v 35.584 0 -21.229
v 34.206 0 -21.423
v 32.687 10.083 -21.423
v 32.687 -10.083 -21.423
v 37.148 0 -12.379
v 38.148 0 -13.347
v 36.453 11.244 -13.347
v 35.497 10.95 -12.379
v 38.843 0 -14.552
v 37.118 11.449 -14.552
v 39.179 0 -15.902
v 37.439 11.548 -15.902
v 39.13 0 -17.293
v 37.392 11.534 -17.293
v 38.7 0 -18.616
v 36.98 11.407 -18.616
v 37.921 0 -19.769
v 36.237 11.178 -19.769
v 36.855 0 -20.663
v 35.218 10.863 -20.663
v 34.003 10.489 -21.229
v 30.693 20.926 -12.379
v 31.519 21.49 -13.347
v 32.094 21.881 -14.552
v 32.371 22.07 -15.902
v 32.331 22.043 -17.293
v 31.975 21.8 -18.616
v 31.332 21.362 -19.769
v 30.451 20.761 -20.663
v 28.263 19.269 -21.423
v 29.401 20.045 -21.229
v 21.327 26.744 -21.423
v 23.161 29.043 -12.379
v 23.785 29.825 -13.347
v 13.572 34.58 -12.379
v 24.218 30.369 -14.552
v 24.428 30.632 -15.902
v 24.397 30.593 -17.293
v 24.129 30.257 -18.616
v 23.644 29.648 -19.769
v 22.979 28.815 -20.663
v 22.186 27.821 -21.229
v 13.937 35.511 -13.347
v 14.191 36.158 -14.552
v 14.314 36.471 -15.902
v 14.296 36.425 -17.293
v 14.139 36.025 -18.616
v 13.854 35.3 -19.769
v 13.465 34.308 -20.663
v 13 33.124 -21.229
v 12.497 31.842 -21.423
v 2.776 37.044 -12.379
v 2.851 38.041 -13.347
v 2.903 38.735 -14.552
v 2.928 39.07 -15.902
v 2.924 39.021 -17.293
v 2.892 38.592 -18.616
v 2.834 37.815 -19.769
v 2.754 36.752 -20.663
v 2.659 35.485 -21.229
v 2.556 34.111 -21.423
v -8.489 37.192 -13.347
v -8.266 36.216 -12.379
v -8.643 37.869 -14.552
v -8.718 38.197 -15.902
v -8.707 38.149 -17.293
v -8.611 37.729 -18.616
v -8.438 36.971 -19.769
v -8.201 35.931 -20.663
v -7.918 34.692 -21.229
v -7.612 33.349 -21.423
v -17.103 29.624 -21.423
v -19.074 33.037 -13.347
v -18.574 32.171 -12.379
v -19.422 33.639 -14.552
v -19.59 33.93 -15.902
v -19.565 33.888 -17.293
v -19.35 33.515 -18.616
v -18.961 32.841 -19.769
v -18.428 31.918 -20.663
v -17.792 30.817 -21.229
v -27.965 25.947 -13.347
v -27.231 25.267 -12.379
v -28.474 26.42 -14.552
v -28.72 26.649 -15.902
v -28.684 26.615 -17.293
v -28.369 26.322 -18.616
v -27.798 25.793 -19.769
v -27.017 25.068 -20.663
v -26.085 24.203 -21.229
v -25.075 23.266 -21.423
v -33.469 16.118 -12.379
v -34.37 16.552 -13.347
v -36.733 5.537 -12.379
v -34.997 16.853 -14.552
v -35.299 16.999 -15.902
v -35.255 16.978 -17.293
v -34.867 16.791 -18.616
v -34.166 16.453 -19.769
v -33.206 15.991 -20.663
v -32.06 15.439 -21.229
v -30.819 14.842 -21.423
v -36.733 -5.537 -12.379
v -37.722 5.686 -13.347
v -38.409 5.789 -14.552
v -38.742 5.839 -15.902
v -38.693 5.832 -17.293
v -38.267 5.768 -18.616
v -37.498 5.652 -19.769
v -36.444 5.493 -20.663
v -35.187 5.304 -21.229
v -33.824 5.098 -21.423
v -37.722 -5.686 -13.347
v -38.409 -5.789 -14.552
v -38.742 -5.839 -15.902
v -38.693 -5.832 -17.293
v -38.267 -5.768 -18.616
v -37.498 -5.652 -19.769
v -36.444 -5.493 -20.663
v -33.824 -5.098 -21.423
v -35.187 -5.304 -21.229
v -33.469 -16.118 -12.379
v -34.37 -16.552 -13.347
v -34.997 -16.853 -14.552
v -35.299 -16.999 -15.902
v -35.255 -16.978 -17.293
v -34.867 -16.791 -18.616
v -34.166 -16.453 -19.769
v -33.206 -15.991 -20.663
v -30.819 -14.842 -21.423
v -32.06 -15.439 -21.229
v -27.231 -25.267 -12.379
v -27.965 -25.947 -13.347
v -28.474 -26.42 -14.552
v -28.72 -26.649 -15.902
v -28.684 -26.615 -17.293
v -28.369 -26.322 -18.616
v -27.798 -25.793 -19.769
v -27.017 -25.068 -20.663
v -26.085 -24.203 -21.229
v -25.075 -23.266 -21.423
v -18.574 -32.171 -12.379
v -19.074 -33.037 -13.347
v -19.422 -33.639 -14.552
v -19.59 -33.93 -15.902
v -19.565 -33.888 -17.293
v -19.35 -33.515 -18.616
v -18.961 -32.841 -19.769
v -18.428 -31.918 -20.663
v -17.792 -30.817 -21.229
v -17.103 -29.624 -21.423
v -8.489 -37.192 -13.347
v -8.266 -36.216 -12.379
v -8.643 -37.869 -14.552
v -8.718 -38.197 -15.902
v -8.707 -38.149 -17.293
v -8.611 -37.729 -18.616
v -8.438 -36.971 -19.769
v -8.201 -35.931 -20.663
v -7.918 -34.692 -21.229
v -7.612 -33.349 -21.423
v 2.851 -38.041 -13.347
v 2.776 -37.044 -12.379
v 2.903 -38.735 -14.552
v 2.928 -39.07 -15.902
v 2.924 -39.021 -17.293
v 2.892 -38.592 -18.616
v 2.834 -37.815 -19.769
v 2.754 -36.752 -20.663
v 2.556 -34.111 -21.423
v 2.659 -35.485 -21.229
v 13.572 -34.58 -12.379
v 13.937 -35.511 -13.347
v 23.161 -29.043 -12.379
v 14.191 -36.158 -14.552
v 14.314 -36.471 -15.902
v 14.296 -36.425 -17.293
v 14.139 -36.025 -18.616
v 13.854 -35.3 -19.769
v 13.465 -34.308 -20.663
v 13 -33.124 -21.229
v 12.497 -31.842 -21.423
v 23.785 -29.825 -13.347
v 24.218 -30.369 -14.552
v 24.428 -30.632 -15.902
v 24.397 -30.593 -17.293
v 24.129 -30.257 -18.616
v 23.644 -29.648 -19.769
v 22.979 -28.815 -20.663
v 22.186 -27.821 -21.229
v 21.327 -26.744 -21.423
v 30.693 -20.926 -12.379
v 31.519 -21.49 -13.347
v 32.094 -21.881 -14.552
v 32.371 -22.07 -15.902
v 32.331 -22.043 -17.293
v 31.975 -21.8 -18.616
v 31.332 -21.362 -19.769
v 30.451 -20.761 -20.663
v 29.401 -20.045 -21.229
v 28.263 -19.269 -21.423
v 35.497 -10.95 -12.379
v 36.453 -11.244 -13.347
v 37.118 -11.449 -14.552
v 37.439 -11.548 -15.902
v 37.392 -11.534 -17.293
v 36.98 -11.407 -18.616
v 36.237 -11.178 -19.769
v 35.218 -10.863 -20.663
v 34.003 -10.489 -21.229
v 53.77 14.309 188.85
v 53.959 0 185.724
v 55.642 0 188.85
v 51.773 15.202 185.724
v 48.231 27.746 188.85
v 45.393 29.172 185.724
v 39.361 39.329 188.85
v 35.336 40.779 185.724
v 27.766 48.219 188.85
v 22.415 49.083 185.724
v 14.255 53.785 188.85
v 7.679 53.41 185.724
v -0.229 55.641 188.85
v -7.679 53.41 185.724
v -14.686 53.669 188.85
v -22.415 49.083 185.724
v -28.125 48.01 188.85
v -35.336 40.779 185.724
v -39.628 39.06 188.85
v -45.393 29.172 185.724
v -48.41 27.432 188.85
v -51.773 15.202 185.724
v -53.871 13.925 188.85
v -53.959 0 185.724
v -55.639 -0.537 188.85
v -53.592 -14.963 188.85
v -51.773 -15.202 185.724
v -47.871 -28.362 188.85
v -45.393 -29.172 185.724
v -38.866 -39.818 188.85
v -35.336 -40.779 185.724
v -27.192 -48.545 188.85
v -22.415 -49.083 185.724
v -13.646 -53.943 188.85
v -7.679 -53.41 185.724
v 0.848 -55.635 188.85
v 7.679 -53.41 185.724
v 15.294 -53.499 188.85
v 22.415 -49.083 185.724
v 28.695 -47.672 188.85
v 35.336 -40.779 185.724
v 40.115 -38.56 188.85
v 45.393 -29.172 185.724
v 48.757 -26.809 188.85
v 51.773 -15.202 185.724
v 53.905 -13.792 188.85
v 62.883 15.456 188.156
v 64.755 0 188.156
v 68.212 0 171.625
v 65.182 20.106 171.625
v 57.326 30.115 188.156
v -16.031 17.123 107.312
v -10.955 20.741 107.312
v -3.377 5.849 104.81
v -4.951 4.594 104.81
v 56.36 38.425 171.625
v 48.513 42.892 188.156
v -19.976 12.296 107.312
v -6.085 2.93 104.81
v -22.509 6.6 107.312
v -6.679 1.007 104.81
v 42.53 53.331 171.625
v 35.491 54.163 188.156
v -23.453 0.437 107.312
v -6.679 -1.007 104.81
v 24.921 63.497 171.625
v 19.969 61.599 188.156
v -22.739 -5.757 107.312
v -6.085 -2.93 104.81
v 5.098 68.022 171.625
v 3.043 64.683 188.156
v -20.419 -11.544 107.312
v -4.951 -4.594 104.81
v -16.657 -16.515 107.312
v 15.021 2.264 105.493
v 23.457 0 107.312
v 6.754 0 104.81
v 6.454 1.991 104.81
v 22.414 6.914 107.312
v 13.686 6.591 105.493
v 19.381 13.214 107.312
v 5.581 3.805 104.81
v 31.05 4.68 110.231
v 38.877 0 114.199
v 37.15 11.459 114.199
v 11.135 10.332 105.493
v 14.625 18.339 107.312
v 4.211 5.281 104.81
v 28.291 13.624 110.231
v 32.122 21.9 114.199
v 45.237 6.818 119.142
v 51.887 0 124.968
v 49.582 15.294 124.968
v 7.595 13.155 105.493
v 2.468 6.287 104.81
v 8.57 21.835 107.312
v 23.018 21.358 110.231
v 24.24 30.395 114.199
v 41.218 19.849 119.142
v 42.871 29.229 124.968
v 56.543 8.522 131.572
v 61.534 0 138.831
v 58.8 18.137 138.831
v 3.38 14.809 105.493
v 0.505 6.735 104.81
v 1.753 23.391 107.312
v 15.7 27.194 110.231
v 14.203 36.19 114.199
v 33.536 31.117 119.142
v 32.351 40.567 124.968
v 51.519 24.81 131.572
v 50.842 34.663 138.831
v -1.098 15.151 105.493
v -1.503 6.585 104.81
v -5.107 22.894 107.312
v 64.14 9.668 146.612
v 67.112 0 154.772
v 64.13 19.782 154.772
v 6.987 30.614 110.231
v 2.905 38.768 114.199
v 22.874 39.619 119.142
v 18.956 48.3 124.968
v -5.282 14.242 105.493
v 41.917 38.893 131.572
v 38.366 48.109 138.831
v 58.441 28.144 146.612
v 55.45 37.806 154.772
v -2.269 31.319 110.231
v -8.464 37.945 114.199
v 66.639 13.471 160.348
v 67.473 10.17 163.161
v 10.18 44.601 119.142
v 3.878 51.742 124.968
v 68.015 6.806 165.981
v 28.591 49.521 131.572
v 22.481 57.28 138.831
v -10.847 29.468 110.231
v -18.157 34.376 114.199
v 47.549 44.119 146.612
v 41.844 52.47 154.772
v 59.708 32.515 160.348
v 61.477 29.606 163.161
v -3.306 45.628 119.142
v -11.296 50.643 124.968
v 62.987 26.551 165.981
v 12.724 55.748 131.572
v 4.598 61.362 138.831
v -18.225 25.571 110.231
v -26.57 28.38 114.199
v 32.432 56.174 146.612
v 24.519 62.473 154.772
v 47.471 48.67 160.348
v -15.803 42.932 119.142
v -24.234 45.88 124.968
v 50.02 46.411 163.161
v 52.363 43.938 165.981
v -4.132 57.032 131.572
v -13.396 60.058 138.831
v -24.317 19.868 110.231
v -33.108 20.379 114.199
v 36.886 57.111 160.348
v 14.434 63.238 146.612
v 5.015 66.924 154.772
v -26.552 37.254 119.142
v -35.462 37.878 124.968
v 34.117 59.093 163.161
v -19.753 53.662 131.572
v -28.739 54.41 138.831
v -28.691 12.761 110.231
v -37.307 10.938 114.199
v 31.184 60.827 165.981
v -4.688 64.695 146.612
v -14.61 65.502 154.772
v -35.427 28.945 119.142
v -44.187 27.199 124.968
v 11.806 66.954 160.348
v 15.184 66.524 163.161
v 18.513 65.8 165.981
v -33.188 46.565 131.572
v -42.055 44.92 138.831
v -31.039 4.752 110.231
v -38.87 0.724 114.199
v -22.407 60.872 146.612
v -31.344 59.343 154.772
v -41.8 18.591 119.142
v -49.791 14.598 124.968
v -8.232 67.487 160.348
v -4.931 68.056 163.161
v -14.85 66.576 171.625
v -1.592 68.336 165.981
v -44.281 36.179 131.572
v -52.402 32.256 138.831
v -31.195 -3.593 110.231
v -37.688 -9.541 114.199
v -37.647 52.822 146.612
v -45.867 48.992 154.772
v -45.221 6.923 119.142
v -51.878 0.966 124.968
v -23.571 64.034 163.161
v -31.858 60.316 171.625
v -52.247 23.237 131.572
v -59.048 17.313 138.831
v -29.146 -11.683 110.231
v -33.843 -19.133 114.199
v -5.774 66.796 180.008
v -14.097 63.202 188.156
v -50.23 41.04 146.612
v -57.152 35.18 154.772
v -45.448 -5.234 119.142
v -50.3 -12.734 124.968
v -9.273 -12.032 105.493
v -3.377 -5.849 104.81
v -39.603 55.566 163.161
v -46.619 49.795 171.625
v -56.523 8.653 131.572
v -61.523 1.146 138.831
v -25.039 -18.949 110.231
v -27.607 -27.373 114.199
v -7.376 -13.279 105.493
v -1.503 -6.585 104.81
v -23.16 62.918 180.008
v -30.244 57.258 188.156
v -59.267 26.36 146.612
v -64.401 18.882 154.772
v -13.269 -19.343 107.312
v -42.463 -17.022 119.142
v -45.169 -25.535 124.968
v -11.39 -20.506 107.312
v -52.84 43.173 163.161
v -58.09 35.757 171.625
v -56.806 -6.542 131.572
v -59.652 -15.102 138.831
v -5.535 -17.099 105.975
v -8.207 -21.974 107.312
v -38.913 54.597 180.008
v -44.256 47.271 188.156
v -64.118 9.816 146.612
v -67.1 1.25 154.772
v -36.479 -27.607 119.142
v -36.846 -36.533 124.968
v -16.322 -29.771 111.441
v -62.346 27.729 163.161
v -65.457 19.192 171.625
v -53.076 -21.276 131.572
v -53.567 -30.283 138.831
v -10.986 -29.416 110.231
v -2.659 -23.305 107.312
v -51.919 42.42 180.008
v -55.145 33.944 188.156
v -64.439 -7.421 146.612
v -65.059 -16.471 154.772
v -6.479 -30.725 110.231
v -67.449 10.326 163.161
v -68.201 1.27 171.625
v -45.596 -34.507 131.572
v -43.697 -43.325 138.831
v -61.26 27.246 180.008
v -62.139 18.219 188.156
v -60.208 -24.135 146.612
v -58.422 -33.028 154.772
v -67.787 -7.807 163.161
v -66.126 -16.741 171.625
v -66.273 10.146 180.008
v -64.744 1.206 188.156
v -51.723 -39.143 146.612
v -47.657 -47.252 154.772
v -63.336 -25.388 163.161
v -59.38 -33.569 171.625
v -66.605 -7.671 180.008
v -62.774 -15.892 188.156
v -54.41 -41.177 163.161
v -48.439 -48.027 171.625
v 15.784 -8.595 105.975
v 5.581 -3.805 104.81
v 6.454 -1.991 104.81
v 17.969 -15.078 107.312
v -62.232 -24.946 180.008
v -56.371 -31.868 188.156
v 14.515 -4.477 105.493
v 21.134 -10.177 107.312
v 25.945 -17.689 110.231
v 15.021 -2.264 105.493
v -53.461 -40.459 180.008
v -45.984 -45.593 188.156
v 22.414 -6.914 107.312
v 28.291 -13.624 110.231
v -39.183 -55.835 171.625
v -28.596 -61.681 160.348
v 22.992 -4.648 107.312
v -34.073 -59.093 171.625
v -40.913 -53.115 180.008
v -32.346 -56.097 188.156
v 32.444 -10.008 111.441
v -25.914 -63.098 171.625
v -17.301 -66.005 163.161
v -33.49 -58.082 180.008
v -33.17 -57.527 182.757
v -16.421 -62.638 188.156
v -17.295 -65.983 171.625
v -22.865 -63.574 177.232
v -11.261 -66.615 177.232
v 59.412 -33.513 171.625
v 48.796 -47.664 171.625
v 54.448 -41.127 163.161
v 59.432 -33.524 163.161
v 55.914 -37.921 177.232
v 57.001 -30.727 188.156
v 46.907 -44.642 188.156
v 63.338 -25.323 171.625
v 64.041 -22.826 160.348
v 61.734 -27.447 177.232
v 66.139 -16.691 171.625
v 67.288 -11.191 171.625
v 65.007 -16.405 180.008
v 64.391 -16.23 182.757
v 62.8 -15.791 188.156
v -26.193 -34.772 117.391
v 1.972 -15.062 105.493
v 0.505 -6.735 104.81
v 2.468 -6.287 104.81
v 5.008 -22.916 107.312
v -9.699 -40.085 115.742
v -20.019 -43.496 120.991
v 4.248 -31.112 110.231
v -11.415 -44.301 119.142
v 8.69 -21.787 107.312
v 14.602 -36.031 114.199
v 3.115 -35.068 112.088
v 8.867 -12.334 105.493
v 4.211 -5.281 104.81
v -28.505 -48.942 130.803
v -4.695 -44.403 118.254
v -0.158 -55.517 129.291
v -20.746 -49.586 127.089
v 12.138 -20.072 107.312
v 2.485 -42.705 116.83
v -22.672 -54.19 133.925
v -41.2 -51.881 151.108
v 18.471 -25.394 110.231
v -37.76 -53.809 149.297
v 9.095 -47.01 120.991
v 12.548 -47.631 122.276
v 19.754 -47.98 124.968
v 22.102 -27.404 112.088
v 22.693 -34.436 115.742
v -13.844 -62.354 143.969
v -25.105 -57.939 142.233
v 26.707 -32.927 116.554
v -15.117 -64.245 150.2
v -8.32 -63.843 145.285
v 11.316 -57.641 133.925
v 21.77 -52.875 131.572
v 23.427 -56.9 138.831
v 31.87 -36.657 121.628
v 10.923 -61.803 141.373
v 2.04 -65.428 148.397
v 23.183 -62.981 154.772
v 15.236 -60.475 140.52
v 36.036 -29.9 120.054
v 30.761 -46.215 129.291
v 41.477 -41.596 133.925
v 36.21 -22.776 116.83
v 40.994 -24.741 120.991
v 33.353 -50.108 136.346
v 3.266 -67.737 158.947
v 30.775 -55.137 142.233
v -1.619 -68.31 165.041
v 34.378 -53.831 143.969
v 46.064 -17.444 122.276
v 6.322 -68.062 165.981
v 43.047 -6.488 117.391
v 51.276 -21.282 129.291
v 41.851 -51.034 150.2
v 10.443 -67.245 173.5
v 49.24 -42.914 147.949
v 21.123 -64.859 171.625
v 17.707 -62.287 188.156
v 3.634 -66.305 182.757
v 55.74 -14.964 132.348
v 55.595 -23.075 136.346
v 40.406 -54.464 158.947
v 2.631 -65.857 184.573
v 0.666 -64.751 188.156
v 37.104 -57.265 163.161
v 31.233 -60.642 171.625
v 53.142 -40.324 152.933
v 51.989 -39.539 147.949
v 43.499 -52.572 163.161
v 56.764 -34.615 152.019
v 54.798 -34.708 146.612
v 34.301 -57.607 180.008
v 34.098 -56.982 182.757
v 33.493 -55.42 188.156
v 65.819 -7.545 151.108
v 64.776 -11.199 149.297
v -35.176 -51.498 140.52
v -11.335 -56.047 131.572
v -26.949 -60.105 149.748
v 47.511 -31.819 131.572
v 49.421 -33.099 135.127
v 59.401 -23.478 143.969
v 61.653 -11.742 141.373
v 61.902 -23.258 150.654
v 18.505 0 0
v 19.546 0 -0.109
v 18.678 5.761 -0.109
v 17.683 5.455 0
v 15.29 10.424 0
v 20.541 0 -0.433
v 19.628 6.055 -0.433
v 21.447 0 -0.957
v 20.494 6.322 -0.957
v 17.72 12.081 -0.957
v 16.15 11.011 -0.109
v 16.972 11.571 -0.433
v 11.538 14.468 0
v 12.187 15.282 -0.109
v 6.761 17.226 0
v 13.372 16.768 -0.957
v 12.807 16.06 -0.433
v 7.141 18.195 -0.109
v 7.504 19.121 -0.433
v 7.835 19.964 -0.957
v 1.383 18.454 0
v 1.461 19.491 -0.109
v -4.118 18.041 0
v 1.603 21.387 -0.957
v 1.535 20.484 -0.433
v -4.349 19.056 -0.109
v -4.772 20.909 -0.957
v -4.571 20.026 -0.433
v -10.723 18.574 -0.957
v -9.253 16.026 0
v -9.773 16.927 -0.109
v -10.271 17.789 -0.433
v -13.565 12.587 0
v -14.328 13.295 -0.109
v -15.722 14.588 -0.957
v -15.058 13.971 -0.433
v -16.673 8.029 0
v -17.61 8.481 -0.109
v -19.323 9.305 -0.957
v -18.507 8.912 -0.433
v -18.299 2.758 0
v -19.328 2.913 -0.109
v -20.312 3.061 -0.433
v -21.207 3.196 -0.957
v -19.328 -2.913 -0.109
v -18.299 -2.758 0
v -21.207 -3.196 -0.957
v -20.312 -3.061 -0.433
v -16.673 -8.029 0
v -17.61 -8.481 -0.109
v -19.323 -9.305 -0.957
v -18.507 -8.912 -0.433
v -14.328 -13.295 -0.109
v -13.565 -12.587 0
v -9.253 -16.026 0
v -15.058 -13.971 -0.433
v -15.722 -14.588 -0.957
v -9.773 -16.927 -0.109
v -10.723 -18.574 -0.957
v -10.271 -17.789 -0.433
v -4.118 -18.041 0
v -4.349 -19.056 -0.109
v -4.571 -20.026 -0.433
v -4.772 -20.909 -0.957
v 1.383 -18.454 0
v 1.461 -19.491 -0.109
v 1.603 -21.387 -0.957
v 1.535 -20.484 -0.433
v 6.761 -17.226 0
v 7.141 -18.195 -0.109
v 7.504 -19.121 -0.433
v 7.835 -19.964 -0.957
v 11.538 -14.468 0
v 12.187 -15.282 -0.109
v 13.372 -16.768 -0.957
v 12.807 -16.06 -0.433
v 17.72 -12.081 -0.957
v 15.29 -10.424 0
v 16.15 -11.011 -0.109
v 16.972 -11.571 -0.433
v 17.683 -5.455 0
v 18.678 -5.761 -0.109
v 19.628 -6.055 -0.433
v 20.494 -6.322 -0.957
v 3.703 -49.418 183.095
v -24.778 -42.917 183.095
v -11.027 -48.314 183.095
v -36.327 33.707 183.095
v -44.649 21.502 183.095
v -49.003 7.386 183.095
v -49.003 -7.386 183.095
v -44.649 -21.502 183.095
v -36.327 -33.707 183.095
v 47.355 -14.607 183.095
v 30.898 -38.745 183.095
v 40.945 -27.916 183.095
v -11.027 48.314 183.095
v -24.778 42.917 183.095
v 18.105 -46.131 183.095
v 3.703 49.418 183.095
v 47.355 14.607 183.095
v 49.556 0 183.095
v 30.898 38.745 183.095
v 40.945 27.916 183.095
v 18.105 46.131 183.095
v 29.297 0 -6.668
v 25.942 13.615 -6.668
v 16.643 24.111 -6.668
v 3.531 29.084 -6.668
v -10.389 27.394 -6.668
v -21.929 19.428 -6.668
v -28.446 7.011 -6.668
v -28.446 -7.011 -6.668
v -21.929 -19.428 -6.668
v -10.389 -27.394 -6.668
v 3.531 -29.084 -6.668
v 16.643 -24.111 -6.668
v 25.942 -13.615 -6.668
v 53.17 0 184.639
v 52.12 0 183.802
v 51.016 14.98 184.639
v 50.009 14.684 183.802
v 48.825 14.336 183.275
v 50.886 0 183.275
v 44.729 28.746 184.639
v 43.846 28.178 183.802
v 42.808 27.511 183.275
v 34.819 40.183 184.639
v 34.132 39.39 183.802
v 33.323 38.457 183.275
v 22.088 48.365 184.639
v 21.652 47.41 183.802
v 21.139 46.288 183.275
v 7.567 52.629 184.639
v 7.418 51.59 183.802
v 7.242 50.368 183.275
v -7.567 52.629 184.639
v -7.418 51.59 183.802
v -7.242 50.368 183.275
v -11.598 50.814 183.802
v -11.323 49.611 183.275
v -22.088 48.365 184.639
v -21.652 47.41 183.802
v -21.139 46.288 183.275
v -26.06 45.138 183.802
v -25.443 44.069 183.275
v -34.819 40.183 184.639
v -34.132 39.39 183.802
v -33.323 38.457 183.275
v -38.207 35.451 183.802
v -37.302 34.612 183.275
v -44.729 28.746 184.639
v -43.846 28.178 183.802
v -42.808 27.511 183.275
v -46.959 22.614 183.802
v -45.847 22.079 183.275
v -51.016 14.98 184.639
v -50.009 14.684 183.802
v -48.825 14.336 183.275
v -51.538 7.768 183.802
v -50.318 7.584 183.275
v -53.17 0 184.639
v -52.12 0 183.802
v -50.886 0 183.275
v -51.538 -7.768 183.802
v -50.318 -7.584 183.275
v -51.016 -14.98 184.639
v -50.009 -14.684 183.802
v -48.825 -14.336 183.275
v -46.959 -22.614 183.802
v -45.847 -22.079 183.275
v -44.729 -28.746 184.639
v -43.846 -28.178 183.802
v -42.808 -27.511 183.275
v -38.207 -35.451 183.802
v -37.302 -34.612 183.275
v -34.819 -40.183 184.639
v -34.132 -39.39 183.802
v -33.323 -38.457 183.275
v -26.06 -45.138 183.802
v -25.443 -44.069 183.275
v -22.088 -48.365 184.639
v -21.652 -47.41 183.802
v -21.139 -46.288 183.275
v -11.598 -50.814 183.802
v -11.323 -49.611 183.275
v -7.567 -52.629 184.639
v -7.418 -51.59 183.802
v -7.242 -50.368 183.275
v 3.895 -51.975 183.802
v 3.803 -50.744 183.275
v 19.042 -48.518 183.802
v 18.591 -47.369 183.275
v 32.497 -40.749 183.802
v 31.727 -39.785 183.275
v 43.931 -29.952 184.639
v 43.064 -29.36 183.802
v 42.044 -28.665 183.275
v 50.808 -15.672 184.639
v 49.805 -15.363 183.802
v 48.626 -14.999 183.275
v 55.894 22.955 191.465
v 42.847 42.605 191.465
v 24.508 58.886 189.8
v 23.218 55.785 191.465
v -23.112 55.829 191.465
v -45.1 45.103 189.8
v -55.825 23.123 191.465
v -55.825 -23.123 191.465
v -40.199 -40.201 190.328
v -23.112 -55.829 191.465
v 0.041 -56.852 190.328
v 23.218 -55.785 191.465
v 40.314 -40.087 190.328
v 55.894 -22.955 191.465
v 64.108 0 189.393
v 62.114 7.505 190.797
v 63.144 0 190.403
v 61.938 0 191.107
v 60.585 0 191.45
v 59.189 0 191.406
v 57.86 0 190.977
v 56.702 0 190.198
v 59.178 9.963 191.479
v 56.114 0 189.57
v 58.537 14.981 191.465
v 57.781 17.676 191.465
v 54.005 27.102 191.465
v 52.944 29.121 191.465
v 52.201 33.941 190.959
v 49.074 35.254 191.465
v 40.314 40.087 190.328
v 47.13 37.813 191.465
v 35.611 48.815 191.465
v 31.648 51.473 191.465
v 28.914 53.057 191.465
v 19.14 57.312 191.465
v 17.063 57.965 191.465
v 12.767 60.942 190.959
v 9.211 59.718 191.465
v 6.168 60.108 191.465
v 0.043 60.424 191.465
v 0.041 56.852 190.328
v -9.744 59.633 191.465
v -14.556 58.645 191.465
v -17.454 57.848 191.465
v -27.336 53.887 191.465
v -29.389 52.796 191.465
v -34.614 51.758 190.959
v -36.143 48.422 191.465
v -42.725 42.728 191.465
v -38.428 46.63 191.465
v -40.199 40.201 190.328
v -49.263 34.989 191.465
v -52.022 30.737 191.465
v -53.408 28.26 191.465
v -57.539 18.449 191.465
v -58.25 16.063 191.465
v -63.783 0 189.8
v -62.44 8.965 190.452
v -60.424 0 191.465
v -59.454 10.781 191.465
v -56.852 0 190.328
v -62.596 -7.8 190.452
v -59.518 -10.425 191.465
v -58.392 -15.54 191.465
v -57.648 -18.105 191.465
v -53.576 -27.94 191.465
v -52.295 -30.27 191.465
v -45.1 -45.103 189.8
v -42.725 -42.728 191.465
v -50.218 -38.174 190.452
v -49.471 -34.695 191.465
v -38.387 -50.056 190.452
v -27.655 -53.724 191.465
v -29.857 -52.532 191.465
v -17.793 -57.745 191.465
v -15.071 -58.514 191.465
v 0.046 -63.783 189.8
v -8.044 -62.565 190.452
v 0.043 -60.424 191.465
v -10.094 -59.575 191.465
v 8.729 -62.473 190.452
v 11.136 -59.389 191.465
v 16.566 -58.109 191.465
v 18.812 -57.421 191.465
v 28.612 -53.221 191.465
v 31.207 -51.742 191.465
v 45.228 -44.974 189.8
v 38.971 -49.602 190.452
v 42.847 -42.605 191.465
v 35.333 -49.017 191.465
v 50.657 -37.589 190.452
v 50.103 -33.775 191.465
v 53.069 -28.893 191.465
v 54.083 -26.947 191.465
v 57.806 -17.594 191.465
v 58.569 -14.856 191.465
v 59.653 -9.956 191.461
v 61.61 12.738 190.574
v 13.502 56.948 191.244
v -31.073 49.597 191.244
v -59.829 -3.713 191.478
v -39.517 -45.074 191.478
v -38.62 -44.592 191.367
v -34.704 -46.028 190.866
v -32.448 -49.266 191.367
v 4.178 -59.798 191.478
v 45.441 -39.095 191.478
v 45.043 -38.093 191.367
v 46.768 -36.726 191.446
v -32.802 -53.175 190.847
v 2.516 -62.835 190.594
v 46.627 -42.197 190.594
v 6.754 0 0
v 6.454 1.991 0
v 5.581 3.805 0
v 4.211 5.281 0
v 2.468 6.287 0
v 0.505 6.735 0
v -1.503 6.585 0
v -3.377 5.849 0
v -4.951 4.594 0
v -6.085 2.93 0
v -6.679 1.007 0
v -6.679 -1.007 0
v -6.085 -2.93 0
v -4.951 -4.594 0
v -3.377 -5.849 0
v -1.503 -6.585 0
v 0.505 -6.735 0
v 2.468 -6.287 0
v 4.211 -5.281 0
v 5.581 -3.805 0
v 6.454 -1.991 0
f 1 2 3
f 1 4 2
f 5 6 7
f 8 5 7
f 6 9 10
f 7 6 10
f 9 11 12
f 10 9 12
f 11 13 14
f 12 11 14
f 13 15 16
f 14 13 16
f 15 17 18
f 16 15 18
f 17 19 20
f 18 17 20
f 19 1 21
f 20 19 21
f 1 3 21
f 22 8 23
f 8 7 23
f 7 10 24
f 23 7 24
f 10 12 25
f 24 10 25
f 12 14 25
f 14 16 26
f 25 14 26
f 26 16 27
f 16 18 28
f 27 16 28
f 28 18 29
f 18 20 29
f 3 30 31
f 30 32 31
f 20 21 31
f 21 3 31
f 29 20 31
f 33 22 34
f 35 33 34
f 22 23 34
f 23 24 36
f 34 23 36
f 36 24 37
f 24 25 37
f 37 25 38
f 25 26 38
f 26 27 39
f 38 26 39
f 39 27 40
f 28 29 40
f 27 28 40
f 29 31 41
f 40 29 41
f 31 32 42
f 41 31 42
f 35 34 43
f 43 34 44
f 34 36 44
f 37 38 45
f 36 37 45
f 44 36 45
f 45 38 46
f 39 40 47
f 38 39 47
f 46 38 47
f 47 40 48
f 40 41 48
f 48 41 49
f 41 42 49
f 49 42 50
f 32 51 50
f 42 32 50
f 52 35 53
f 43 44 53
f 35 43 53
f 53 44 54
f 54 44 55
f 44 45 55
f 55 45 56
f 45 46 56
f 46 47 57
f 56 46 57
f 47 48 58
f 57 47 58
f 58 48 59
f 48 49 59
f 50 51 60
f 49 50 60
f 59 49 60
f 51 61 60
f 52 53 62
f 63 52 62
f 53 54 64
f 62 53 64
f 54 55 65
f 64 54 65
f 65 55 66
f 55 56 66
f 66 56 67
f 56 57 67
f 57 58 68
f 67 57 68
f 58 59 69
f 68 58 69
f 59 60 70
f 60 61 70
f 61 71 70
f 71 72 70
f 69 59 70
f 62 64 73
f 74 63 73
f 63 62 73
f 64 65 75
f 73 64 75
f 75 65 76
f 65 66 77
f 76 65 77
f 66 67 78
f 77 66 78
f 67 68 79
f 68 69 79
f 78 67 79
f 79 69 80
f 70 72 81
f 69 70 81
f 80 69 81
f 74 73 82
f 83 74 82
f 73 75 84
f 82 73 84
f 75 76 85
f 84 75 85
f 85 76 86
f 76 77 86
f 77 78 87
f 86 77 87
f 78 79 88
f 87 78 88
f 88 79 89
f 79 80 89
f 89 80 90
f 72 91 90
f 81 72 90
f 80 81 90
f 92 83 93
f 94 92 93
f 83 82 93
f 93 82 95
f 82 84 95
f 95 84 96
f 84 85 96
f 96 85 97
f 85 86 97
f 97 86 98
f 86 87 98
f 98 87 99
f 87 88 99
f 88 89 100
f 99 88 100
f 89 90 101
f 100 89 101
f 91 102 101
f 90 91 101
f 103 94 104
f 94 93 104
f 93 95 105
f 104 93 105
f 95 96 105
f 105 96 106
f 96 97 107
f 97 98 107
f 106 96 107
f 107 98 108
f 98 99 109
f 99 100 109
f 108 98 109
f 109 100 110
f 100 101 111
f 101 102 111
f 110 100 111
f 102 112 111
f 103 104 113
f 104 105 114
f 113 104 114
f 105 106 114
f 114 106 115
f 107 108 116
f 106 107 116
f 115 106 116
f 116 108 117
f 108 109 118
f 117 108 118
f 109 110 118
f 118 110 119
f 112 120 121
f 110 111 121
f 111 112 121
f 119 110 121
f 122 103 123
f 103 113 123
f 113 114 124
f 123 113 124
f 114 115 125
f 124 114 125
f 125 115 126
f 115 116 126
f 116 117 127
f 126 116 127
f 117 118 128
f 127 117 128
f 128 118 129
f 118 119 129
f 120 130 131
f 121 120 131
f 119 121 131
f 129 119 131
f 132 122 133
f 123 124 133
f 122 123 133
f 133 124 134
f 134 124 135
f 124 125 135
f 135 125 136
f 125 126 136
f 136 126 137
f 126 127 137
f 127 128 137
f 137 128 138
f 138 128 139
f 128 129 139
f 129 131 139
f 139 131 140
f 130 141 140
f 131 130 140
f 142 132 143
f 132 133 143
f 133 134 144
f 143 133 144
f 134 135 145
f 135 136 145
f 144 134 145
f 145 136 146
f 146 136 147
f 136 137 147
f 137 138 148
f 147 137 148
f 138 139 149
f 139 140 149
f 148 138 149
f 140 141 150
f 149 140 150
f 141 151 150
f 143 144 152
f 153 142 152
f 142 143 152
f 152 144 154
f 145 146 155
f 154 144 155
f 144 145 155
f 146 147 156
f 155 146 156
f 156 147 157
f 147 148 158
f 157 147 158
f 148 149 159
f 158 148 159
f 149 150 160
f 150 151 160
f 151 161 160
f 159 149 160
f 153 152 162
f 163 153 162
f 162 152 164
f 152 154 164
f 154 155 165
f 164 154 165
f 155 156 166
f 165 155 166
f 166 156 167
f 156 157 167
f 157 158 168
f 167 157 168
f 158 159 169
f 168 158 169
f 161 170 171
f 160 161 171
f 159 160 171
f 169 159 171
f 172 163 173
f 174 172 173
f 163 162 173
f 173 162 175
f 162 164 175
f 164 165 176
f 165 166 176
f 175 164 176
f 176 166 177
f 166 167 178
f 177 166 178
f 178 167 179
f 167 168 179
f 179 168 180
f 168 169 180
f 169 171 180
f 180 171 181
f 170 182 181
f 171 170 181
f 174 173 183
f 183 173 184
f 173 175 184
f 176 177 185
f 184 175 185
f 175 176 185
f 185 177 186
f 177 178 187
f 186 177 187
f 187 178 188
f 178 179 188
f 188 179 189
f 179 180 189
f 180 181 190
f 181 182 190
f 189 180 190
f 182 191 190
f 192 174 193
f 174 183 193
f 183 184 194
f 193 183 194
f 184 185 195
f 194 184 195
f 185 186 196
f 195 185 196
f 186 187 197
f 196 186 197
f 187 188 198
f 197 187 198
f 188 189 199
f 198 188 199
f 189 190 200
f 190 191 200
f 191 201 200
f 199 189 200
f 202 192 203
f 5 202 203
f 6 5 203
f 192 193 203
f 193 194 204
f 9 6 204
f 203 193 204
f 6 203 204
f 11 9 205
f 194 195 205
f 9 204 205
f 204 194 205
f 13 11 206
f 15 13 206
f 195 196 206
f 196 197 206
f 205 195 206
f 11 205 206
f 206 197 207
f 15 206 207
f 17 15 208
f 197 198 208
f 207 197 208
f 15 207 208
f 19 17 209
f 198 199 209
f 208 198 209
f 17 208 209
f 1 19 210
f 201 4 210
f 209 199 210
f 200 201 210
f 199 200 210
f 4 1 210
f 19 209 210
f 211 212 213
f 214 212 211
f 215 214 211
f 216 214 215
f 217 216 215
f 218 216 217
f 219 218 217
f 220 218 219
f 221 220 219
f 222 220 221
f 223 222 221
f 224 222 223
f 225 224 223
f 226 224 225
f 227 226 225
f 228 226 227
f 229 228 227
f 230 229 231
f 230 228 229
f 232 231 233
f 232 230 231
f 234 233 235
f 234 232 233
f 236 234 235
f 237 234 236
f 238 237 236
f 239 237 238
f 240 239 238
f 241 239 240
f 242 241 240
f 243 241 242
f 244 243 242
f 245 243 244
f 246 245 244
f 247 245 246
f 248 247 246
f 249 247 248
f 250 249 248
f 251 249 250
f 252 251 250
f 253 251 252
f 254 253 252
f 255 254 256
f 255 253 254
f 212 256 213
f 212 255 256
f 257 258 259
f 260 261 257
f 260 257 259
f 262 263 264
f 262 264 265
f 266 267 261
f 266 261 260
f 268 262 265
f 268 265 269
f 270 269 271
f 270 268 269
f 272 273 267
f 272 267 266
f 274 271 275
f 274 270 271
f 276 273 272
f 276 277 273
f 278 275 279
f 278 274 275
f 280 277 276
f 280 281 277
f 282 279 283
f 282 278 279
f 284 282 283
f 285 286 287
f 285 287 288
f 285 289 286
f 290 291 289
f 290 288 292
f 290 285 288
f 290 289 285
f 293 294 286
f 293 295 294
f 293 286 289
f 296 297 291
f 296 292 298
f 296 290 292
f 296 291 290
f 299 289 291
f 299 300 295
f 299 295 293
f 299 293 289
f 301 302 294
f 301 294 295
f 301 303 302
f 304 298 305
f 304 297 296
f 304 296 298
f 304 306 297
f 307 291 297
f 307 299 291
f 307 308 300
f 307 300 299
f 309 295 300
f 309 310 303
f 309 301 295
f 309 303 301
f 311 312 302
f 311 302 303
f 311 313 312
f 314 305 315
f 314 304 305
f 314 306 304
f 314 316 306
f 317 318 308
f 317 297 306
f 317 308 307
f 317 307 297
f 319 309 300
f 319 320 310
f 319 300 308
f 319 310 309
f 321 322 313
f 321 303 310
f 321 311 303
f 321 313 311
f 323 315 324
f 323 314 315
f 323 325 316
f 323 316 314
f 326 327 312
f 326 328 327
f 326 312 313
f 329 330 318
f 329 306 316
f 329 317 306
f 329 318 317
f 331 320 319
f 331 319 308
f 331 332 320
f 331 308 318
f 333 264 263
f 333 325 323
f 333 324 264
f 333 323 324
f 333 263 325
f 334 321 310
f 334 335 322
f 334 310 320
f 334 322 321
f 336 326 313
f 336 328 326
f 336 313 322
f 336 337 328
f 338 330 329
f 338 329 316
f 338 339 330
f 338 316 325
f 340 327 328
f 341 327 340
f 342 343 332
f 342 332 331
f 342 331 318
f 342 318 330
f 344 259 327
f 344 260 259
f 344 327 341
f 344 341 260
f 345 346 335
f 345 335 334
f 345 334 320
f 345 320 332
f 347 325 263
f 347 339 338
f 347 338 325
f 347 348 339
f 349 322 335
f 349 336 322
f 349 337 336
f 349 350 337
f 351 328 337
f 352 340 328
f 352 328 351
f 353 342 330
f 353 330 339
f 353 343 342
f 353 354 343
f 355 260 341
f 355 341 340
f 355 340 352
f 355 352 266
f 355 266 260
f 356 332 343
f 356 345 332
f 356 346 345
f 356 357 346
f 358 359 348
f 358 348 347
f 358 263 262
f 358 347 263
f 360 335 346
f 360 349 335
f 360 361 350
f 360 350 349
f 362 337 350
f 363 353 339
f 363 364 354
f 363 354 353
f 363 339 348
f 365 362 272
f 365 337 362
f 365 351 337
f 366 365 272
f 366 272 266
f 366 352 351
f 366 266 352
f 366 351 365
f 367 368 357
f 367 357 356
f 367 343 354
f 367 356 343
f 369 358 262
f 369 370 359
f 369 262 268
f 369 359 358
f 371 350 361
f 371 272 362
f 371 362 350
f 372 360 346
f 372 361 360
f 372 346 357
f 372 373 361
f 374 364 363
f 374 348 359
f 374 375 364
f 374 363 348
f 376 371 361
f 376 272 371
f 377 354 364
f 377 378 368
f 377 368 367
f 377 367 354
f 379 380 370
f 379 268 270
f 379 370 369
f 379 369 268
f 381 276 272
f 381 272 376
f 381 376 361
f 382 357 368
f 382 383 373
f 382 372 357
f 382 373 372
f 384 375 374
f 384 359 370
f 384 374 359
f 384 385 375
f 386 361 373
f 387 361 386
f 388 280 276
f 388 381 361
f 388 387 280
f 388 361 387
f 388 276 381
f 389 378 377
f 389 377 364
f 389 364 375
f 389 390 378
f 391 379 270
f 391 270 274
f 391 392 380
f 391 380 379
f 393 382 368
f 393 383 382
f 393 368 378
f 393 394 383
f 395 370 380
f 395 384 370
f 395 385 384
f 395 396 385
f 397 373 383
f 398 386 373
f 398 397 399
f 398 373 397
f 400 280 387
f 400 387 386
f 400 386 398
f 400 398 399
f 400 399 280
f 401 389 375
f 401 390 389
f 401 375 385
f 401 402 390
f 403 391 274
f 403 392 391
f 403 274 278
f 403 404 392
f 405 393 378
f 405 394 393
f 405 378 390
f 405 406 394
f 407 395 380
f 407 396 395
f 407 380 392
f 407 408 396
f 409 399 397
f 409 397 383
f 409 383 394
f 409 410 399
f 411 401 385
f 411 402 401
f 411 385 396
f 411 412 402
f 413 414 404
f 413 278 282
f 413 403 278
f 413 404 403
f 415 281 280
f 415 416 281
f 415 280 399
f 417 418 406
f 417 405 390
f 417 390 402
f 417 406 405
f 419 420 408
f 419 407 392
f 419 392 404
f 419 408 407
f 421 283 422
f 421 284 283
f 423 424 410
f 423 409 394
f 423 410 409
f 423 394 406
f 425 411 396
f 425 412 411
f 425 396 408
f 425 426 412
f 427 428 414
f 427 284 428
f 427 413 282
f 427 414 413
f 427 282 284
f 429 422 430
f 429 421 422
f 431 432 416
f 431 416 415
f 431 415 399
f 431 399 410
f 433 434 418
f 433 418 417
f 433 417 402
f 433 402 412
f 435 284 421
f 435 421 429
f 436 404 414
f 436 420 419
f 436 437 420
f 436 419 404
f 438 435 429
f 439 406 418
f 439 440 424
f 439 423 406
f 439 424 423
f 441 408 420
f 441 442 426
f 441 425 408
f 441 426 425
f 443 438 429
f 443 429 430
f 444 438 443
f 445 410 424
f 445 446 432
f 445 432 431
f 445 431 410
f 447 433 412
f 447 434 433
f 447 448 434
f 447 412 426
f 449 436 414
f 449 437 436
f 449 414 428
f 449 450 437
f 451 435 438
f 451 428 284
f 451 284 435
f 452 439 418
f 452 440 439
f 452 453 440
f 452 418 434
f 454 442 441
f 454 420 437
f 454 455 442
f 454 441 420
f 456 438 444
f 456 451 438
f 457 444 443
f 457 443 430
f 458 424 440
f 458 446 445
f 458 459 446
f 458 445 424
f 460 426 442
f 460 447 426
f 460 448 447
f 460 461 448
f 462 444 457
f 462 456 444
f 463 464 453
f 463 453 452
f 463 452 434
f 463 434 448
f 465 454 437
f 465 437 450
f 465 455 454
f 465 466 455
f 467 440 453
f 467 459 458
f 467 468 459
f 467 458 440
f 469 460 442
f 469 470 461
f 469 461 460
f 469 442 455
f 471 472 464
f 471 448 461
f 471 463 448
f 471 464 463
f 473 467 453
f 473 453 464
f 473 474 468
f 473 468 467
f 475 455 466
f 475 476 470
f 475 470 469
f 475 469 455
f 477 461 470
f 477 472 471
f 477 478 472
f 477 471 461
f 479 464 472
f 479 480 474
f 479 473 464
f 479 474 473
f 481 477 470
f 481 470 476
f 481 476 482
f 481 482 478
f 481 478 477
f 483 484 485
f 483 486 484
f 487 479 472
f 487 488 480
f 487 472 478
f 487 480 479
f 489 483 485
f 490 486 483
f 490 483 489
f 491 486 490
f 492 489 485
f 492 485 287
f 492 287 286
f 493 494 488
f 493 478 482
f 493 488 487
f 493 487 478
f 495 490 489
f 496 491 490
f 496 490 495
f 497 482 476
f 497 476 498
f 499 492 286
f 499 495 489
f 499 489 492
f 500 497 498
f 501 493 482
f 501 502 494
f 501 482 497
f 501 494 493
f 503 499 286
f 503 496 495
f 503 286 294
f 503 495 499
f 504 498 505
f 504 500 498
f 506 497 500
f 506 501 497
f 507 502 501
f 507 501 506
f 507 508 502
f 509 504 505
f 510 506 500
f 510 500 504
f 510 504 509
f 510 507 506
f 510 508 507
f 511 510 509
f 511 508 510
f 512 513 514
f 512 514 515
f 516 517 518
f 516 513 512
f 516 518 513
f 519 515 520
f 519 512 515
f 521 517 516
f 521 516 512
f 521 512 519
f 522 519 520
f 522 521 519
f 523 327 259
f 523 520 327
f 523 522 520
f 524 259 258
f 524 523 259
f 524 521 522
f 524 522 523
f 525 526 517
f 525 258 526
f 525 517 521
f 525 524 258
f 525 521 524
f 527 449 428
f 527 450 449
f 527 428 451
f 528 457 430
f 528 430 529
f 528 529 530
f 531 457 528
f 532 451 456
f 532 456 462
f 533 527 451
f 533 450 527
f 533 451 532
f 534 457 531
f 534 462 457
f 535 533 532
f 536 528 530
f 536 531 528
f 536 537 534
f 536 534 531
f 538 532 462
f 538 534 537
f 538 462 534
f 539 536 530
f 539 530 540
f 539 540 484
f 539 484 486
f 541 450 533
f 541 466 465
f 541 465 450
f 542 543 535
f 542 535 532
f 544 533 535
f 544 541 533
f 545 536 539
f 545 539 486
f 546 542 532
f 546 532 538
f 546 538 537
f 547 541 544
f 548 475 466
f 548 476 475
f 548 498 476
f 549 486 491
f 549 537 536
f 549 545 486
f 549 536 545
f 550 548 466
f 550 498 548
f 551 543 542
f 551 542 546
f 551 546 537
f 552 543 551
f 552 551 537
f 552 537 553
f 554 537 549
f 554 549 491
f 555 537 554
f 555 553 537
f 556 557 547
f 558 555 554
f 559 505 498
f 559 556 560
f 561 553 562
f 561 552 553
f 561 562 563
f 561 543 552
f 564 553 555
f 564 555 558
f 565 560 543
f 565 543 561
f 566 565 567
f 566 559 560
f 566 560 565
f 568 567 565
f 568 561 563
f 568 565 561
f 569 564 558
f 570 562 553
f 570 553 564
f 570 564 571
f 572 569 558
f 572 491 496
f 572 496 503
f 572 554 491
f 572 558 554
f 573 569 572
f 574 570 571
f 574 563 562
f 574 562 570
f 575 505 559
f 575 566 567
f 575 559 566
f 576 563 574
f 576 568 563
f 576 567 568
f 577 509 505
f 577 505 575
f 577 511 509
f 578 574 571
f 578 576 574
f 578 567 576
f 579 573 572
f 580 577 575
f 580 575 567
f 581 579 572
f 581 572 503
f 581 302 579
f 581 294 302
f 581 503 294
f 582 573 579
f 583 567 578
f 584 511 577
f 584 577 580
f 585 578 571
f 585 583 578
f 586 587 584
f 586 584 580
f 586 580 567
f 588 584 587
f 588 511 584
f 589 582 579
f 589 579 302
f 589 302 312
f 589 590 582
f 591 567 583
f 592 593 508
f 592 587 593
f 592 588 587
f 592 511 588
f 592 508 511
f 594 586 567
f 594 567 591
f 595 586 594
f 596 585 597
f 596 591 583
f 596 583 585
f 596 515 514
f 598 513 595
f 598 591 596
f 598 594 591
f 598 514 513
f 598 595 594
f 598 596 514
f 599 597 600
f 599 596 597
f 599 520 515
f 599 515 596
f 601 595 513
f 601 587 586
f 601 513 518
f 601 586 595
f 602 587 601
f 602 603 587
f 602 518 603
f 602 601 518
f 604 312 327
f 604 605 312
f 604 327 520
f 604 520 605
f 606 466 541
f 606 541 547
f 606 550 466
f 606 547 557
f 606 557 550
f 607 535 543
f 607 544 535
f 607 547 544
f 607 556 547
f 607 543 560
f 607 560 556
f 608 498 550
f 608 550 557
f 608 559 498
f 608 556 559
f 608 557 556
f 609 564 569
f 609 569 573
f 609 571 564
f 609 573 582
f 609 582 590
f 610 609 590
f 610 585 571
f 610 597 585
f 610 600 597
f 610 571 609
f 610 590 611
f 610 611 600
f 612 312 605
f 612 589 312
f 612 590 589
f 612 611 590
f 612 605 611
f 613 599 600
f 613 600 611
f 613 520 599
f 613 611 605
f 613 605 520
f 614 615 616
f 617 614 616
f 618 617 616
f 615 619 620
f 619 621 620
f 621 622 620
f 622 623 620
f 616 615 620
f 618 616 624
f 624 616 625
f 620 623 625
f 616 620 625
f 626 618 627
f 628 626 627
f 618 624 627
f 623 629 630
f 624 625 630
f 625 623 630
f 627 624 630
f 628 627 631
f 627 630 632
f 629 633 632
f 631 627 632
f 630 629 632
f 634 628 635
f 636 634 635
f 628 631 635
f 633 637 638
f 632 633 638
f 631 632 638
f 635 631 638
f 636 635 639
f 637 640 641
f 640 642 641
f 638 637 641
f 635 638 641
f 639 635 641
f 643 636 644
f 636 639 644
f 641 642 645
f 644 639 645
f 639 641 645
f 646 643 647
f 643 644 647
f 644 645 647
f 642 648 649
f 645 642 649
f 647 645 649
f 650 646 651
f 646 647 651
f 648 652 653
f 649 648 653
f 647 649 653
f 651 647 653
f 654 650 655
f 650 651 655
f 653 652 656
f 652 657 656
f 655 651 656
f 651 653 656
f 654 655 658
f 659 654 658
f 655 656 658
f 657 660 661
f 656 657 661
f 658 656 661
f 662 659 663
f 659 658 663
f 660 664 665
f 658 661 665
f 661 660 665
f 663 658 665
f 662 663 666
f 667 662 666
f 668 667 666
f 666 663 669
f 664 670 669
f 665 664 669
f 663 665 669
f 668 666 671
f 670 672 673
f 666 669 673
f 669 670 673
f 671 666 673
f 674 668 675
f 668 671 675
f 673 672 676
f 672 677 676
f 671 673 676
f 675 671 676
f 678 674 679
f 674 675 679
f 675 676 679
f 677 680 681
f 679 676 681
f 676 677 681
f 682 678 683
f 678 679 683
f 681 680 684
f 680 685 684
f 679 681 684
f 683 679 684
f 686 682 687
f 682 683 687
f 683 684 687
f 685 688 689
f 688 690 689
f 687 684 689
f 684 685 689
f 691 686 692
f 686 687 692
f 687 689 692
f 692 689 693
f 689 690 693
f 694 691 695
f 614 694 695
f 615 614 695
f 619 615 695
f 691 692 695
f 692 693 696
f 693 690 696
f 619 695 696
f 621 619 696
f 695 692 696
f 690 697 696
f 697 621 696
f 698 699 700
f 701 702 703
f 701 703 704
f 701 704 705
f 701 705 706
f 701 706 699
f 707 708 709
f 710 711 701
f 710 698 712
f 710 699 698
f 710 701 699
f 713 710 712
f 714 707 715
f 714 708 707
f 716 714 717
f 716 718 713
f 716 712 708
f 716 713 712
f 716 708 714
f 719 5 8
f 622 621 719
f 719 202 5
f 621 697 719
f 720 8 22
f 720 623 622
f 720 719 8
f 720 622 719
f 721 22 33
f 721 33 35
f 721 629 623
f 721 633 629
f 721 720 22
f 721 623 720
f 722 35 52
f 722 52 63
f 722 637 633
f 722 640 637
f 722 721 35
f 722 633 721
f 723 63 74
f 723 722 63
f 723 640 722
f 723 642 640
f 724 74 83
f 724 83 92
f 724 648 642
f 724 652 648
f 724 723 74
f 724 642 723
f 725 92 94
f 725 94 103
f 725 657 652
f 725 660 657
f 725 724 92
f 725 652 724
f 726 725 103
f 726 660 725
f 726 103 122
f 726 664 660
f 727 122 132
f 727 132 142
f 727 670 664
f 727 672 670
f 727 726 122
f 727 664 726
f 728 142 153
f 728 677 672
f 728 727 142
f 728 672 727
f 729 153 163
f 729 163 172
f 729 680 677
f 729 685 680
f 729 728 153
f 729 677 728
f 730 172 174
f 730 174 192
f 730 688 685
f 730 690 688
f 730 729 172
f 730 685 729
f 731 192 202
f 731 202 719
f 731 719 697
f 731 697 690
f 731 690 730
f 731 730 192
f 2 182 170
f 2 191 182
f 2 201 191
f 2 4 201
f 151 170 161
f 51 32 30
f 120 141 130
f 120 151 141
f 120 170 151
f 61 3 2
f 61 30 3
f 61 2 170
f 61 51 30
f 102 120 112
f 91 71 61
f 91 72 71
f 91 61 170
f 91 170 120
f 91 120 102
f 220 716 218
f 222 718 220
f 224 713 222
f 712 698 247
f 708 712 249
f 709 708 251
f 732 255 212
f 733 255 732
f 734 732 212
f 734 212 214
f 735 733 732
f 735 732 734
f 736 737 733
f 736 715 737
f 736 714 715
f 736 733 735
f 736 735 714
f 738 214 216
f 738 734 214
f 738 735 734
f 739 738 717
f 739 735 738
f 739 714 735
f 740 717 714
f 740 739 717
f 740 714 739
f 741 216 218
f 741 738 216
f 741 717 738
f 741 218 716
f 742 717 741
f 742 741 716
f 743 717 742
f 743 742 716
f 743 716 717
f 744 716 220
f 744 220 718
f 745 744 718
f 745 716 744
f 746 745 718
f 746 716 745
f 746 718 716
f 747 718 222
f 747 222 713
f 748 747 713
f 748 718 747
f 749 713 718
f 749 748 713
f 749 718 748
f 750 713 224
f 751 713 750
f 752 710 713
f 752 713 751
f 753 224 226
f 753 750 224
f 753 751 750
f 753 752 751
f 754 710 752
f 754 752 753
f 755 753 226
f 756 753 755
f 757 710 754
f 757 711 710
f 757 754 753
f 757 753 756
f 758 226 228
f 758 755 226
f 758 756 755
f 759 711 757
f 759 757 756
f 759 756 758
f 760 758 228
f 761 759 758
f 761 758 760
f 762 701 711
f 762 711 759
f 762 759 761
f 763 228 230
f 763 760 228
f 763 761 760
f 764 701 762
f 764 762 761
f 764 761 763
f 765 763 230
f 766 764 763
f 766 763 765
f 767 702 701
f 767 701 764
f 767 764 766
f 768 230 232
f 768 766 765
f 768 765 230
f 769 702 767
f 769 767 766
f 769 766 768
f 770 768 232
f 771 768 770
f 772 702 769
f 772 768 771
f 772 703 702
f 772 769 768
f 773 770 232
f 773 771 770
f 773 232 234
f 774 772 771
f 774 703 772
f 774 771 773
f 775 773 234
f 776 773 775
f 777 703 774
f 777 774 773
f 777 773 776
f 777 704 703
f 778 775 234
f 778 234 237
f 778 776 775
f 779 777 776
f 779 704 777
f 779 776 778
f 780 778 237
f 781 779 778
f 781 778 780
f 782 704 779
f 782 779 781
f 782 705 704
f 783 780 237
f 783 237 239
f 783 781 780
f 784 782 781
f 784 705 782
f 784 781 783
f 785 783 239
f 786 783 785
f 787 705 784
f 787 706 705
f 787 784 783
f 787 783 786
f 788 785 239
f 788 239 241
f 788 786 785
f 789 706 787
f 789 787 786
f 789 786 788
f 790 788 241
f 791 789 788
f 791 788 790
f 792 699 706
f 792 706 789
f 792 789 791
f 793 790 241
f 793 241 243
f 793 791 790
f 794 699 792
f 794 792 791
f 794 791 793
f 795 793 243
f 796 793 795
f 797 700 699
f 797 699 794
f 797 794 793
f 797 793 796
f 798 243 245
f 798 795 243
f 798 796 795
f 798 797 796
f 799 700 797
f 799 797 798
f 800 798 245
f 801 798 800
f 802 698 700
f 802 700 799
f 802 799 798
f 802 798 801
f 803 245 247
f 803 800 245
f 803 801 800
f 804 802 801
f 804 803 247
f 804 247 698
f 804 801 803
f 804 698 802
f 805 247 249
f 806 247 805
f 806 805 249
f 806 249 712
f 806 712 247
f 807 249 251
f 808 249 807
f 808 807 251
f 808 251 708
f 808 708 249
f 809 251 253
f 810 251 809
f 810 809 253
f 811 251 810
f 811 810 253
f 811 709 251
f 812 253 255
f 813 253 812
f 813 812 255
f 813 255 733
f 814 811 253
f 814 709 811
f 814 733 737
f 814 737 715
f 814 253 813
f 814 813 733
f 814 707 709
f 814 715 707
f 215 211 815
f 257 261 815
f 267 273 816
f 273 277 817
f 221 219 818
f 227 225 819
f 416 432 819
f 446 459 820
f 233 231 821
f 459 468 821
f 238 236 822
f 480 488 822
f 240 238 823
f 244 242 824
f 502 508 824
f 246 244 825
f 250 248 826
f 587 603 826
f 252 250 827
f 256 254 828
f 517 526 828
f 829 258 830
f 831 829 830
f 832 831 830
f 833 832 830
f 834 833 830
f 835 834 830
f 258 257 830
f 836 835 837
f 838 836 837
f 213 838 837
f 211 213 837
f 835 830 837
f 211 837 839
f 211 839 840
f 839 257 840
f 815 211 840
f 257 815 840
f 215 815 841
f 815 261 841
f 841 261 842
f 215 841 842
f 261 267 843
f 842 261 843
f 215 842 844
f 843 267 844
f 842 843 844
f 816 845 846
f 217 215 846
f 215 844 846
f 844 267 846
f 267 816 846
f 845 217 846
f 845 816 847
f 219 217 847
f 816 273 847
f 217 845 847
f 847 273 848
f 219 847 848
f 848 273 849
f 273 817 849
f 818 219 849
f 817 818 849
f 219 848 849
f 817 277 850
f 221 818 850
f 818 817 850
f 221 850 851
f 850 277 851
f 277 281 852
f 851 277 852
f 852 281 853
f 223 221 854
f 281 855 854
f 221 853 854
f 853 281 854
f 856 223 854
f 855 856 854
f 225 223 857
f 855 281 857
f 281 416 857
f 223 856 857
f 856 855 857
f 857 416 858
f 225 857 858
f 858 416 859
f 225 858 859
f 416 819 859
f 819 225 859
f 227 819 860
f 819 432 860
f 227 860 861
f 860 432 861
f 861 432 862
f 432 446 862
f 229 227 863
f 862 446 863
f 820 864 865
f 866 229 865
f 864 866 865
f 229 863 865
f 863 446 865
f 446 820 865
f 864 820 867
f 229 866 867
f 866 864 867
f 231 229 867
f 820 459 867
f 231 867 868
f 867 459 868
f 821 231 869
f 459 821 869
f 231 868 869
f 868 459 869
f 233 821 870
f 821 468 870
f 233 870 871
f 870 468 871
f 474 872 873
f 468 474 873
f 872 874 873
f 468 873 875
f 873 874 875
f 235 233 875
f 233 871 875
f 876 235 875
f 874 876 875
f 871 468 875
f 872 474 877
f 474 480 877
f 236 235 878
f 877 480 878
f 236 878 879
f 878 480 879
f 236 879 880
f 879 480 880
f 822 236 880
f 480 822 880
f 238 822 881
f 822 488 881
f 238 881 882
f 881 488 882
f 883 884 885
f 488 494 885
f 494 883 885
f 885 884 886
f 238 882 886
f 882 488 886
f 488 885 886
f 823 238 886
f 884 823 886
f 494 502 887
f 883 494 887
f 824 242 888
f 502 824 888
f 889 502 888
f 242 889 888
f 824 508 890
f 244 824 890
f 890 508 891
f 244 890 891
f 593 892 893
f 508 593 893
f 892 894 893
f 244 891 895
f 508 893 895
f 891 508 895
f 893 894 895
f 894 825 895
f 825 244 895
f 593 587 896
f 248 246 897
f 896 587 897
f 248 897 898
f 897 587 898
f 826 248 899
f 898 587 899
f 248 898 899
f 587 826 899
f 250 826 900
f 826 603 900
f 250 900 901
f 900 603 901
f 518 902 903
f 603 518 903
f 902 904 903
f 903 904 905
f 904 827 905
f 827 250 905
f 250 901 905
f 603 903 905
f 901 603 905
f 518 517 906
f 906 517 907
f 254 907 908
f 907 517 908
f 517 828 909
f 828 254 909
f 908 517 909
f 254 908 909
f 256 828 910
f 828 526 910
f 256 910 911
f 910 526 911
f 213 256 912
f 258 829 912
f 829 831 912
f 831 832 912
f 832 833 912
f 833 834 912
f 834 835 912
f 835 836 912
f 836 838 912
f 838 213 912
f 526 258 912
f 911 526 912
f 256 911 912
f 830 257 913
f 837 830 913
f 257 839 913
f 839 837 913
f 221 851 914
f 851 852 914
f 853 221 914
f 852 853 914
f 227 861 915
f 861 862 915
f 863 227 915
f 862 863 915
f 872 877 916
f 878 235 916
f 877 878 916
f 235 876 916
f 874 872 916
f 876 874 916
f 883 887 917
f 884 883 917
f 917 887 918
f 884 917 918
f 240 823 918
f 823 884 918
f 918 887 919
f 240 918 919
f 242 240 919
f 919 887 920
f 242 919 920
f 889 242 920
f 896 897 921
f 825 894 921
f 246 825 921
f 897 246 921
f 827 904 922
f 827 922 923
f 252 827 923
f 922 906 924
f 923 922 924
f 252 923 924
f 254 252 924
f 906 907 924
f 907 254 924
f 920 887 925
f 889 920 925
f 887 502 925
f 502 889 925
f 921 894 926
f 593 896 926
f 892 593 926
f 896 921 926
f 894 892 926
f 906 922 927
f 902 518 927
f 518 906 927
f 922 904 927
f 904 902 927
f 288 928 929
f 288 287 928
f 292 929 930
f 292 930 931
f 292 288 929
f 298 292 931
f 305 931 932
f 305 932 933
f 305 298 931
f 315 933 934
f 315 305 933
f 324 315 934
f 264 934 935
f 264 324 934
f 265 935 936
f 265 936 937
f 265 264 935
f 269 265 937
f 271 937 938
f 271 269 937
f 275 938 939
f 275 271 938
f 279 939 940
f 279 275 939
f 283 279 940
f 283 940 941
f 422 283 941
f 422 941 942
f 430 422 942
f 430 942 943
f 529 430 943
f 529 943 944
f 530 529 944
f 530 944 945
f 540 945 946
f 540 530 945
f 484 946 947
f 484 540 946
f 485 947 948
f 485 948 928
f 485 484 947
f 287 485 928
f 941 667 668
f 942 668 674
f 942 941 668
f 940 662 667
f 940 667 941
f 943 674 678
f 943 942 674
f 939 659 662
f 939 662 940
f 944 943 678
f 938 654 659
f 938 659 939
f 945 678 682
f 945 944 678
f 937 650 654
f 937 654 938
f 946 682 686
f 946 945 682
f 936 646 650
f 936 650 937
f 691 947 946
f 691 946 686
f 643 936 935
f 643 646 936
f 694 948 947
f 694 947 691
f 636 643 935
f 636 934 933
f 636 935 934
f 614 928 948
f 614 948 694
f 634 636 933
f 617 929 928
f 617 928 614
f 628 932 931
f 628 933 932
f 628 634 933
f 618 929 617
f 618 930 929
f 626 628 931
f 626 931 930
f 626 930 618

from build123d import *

# Parameters (mm, degrees)
F4_R = 5


with BuildPart() as f1:
    # F0 (on Front) → F1 (revolve)
    with BuildSketch(Plane.XZ):
        with BuildLine():
            Line((0, 183.094785), (0, 0))
            Line((0, 0), (6.754104, 0))
            Line((6.754104, 0), (6.754104, 104.810067))
            ThreePointArc((6.754104, 104.810067), (59.998574, 136.006674), (60.415853, 197.715893))
            Line((60.415853, 197.715893), (52.54294, 183.094785))
            Line((52.54294, 183.094785), (0, 183.094785))
        make_face()
    revolve(axis=Axis((0, 0, 91.547392), (0, 0, 1)))

    # F2 (on Front) → F3 (revolve)
    with BuildSketch(Plane.XZ):
        Polygon((20.131757, 0), (0, 0), (0, -21.42263), (49.578208, -21.42263), align=None)
    revolve(axis=Axis((0, 0, -10.711315), (0, 0, 1)))

    # F4
    f4_edges = [f1.edges().sort_by_distance(p)[0] for p in [
        (-60.415853, 0, 197.715893),
        (-52.54294, 0, 183.094785),
        (-49.578208, 0, -21.42263),
        (-20.131757, 0, 0),
        (34.854983, 0, -10.711315),
    ]]
    fillet(f4_edges, radius=F4_R)


solid = f1.part
